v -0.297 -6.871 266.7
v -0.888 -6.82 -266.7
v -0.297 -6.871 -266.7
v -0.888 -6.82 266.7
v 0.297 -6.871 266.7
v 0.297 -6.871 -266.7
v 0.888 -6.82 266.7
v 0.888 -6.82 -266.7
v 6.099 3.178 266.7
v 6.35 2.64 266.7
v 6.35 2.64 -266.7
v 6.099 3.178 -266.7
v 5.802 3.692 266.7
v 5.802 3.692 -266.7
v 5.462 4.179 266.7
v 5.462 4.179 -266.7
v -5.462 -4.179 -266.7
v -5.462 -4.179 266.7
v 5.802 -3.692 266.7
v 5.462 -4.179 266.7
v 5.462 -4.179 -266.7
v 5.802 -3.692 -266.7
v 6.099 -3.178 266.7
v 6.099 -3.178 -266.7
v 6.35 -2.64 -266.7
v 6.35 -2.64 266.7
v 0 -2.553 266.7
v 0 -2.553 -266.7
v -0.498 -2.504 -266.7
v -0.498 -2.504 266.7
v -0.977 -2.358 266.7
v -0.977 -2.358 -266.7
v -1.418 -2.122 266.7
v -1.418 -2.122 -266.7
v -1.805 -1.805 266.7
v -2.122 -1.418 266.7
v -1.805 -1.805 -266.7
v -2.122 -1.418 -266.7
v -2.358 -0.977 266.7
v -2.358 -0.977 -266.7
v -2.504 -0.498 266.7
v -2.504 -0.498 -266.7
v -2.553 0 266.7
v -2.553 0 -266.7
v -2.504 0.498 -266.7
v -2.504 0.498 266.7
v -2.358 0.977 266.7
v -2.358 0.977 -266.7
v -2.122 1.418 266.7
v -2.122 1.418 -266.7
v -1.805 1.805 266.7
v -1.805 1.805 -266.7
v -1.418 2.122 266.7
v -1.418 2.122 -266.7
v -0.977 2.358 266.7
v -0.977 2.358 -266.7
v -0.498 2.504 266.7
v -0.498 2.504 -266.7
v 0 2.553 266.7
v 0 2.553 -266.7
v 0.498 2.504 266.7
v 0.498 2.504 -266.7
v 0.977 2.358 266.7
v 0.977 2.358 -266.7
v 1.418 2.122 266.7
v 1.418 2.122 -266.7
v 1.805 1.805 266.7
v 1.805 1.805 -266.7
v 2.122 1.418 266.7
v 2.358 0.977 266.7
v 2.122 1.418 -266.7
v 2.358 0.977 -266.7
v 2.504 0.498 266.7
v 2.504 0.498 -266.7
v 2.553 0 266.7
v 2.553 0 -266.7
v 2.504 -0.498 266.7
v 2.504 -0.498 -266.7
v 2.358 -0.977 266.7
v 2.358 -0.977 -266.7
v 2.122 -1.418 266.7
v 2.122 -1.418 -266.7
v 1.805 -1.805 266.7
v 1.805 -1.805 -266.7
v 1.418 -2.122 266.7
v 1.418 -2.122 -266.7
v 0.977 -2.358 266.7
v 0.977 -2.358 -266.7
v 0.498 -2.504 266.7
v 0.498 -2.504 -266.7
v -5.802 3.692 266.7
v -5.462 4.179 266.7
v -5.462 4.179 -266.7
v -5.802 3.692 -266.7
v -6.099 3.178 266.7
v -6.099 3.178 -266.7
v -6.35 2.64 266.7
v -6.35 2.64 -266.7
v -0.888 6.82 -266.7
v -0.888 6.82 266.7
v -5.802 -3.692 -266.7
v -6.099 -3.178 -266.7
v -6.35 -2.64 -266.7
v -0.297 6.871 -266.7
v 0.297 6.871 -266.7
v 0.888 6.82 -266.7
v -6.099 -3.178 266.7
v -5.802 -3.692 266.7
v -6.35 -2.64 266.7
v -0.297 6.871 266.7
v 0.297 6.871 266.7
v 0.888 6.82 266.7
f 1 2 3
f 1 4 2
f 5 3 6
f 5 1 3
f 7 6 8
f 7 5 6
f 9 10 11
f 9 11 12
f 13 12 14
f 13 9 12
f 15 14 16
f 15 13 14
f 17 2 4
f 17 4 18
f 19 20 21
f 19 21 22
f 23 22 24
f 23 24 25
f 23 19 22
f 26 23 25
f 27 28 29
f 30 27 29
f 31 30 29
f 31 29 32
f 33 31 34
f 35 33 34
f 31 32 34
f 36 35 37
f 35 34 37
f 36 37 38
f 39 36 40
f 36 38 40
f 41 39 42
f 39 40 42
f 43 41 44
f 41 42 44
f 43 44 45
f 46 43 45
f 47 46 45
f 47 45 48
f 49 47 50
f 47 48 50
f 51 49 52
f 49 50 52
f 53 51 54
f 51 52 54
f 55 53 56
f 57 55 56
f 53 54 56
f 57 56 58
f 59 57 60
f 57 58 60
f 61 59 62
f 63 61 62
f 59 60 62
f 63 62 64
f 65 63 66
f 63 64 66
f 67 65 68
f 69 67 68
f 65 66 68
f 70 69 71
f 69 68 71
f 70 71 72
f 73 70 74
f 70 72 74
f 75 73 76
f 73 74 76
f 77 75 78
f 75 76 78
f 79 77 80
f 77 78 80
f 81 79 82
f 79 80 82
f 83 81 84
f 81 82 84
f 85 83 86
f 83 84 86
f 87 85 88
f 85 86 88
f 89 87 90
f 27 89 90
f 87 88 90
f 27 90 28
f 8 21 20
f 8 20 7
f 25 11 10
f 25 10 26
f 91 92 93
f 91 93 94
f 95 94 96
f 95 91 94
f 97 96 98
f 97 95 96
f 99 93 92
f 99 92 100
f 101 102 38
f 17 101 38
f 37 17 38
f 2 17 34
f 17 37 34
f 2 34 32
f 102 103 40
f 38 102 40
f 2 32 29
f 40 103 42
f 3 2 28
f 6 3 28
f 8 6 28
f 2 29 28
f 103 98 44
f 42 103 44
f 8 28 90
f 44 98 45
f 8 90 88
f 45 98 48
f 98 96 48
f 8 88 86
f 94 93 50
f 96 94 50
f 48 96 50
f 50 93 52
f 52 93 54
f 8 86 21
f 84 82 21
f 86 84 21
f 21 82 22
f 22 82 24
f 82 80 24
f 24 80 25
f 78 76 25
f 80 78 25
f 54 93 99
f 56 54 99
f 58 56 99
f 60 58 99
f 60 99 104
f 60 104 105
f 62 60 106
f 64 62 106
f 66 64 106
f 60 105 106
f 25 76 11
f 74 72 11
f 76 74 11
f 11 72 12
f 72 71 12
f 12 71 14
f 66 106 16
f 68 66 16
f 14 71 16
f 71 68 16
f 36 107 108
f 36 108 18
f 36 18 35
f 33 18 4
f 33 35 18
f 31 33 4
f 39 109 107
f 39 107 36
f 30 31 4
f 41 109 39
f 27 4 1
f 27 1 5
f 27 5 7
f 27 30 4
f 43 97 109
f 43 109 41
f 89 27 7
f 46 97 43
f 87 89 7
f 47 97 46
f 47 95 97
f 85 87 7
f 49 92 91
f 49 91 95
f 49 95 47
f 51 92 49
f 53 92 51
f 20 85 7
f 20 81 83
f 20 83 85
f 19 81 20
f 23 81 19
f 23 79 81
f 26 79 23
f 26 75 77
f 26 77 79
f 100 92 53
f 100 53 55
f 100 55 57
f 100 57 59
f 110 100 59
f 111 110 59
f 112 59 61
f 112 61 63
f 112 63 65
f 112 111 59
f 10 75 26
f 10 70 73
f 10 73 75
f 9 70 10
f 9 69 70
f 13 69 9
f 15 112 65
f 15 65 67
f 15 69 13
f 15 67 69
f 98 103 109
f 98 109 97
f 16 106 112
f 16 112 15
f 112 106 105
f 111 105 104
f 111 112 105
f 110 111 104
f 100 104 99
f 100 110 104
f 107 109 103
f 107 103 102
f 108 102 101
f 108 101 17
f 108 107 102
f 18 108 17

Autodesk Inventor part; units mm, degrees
ref_plane "YZ Plane" through (0, 0, 0) normal (1, 0, 0) x (0, 1, 0)
ref_plane "XZ Plane" through (0, 0, 0) normal (0, 1, 0) x (-1, 0, 0)
ref_plane "XY Plane" through (0, 0, 0) normal (0, 0, 1) x (1, 0, 0)
sketch "Sketch1" plane through (0, 0, 0) normal (0, 0, 1) x (1, 0, 0)
  line L0 (-6.35, -3.6662) -> (-6.35, 3.6662)
  line L1 (-6.35, 3.6662) -> (0, 7.3323)
  line L2 (0, 7.3323) -> (6.35, 3.6662)
  line L3 (6.35, 3.6662) -> (6.35, -3.6662)
  line L4 (6.35, -3.6662) -> (0, -7.3323)
  line L5 (0, -7.3323) -> (-6.35, -3.6662)
  point P0 (0, 0)
  point P1 (0, 0)
  dimension "Size" = 12.7
extrude "Extrusion1" add sketch "Sketch1" along normal mid plane 533.4
sketch "Sketch3" plane through (0, 0, 266.7) normal (0, 0, 1) x (1, 0, 0)
  line L0 (-6.35, 3.6662) -> (0, 7.3323) construction
  line L1 (0, 7.3323) -> (6.35, 3.6662) construction
  line L2 (6.35, 3.6662) -> (6.35, -3.6662) construction
  line L3 (6.35, -3.6662) -> (0, -7.3323) construction
  line L4 (0, -7.3323) -> (-6.35, -3.6662) construction
  line L5 (-6.35, -3.6662) -> (-6.35, 3.6662) construction
  point P0 (0, 0)
hole "Hole1" at (0, 0, 266.7) direction (0, 0, -1) diameter 5.1054 end through all
sketch "Sketch4" plane through (0, 0, 266.7) normal (0, 0, 1) x (1, 0, 0)
  circle A0 centre (0, 0) radius 2.5527 construction
  line L0 (-6.35, 3.6662) -> (0, 7.3323) construction
  line L1 (0, 7.3323) -> (6.35, 3.6662) construction
  line L2 (6.35, 3.6662) -> (6.35, -3.6662) construction
  line L3 (6.35, -3.6662) -> (0, -7.3323) construction
  line L4 (0, -7.3323) -> (-6.35, -3.6662) construction
  line L5 (-6.35, -3.6662) -> (-6.35, 3.6662) construction
  circle A1 centre (0, 0) radius 6.8771
  circle A2 centre (0, 0) radius 8.89
  dimension "thunder" = 13.7541
  dimension "d16" = 17.78
extrude "Extrusion3" cut sketch "Sketch4" against normal through all
equation "\"bearing\" = 25.4"
properties part number "GI - 002" material "Aluminum 6061"
